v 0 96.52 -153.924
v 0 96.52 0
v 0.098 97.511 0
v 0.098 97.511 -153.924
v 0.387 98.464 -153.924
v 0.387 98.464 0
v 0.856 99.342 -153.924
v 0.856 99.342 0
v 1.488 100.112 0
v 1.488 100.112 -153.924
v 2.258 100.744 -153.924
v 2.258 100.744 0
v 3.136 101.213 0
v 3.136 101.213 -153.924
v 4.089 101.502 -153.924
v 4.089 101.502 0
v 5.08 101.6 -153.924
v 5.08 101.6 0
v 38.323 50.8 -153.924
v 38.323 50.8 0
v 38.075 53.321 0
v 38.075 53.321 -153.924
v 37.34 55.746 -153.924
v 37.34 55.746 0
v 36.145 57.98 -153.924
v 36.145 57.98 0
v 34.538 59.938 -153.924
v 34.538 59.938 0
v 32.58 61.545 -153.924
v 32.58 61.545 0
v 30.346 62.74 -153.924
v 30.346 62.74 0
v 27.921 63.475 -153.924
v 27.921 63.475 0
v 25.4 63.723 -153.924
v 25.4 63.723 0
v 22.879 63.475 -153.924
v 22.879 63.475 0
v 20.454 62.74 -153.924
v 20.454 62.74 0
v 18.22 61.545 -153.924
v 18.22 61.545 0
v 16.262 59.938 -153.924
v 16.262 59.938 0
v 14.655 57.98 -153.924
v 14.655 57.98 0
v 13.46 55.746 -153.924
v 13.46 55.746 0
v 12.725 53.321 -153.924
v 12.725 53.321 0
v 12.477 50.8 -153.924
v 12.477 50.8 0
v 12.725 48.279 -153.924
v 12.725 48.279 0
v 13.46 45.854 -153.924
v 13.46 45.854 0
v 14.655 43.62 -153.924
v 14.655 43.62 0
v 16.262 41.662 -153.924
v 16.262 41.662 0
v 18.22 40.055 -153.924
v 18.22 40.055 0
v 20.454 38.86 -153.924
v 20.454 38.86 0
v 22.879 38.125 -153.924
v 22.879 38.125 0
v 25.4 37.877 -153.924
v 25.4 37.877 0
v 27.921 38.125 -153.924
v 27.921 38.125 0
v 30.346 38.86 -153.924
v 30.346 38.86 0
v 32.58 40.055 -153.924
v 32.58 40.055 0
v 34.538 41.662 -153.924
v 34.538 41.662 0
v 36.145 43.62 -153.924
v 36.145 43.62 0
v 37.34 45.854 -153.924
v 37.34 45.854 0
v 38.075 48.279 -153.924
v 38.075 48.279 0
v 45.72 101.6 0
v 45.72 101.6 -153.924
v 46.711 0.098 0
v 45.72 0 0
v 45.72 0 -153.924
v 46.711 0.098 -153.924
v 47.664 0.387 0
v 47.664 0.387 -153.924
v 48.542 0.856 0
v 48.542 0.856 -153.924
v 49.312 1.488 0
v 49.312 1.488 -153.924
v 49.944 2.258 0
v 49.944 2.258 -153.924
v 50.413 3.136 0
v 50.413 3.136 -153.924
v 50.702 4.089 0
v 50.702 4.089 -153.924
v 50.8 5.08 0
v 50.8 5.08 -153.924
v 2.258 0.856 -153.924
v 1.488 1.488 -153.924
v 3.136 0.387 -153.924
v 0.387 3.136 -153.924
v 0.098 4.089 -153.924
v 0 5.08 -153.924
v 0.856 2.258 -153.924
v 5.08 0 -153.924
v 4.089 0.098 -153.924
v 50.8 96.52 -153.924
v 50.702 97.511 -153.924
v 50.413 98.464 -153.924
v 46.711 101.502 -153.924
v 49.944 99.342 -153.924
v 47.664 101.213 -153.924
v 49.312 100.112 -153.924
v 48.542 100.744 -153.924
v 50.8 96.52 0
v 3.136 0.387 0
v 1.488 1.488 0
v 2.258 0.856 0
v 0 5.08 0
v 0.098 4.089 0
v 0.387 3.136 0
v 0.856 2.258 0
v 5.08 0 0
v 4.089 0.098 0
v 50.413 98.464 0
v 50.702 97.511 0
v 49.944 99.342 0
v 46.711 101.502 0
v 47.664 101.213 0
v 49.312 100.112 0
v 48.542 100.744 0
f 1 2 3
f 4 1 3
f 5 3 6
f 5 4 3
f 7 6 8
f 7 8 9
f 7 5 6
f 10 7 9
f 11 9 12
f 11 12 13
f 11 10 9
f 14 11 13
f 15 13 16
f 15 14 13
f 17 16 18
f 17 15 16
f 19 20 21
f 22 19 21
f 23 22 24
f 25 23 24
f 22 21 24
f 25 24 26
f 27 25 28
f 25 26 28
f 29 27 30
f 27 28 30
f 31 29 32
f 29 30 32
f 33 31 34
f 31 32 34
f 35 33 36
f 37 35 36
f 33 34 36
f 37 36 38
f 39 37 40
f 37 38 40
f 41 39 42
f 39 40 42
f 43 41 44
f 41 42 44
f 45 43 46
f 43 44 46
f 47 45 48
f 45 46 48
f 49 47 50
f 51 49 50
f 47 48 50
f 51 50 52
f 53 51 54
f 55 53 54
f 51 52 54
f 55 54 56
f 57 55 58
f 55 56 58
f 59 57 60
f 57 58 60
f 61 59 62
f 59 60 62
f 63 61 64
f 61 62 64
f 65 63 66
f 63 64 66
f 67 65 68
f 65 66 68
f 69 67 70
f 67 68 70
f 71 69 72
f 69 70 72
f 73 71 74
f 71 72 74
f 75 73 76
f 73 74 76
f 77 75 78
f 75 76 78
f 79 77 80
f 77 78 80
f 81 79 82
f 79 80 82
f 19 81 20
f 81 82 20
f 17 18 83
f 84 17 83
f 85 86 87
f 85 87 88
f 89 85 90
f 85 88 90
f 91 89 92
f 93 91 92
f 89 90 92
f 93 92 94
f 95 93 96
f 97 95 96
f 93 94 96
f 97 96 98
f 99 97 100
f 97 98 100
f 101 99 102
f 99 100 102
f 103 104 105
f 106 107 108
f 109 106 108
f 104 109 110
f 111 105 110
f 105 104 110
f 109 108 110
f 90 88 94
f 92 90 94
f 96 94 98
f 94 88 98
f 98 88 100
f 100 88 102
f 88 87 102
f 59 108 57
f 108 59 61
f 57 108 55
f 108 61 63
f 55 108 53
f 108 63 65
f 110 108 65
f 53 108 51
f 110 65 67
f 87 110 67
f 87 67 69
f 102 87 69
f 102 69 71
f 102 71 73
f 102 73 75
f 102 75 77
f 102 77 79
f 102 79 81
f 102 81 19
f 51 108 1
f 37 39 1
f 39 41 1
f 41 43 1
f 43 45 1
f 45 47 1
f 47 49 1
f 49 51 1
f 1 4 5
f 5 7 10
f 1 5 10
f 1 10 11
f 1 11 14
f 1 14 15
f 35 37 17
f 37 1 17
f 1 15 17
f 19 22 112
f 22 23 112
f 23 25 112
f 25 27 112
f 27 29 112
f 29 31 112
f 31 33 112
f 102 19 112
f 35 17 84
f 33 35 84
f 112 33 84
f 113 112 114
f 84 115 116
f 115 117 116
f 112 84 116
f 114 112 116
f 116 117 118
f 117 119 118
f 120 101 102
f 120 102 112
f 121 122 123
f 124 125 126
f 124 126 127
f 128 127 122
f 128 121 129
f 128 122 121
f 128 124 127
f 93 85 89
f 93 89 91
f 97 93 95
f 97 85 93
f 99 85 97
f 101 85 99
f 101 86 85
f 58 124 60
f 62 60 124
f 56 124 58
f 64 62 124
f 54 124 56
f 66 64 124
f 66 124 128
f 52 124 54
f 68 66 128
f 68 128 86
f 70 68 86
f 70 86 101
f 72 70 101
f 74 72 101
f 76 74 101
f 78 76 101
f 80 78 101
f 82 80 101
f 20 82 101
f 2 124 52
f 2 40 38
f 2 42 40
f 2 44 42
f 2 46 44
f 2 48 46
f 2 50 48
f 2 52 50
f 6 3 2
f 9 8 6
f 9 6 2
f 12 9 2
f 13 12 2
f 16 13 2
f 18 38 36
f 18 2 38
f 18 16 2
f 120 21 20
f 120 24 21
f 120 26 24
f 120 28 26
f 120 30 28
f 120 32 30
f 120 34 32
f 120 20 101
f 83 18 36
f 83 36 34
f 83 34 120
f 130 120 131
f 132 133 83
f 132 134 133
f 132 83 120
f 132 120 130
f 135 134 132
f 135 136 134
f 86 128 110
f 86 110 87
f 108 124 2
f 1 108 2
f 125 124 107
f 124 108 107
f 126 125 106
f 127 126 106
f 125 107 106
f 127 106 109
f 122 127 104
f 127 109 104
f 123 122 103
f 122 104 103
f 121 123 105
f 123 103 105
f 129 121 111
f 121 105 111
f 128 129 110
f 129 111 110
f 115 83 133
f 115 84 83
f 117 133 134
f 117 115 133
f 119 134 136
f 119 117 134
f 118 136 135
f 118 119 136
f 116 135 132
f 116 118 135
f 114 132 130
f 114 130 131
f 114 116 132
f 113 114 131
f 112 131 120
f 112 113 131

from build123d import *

# Parameters (mm, degrees)
F0_W     = 50.8
F0_H     = 101.6
F0_R     = 12.923254
F1_DEPTH = 153.924
F2_R     = 5.08


with BuildPart() as f1:
    # F0 (on Top) → F1 (new body)
    with BuildSketch(Plane.XY):
        with Locations((25.4, 50.8)):
            Rectangle(F0_W, F0_H)
        with Locations((25.4, 50.8)):
            Circle(F0_R, mode=Mode.SUBTRACT)
    extrude(amount=-F1_DEPTH)

    # F2
    f2_edges = [f1.edges().sort_by_distance(p)[0] for p in [
        (50.8, 0, -76.962),
        (50.8, 101.6, -76.962),
        (0, 0, -76.962),
        (0, 101.6, -76.962),
    ]]
    fillet(f2_edges, radius=F2_R)


solid = f1.part
